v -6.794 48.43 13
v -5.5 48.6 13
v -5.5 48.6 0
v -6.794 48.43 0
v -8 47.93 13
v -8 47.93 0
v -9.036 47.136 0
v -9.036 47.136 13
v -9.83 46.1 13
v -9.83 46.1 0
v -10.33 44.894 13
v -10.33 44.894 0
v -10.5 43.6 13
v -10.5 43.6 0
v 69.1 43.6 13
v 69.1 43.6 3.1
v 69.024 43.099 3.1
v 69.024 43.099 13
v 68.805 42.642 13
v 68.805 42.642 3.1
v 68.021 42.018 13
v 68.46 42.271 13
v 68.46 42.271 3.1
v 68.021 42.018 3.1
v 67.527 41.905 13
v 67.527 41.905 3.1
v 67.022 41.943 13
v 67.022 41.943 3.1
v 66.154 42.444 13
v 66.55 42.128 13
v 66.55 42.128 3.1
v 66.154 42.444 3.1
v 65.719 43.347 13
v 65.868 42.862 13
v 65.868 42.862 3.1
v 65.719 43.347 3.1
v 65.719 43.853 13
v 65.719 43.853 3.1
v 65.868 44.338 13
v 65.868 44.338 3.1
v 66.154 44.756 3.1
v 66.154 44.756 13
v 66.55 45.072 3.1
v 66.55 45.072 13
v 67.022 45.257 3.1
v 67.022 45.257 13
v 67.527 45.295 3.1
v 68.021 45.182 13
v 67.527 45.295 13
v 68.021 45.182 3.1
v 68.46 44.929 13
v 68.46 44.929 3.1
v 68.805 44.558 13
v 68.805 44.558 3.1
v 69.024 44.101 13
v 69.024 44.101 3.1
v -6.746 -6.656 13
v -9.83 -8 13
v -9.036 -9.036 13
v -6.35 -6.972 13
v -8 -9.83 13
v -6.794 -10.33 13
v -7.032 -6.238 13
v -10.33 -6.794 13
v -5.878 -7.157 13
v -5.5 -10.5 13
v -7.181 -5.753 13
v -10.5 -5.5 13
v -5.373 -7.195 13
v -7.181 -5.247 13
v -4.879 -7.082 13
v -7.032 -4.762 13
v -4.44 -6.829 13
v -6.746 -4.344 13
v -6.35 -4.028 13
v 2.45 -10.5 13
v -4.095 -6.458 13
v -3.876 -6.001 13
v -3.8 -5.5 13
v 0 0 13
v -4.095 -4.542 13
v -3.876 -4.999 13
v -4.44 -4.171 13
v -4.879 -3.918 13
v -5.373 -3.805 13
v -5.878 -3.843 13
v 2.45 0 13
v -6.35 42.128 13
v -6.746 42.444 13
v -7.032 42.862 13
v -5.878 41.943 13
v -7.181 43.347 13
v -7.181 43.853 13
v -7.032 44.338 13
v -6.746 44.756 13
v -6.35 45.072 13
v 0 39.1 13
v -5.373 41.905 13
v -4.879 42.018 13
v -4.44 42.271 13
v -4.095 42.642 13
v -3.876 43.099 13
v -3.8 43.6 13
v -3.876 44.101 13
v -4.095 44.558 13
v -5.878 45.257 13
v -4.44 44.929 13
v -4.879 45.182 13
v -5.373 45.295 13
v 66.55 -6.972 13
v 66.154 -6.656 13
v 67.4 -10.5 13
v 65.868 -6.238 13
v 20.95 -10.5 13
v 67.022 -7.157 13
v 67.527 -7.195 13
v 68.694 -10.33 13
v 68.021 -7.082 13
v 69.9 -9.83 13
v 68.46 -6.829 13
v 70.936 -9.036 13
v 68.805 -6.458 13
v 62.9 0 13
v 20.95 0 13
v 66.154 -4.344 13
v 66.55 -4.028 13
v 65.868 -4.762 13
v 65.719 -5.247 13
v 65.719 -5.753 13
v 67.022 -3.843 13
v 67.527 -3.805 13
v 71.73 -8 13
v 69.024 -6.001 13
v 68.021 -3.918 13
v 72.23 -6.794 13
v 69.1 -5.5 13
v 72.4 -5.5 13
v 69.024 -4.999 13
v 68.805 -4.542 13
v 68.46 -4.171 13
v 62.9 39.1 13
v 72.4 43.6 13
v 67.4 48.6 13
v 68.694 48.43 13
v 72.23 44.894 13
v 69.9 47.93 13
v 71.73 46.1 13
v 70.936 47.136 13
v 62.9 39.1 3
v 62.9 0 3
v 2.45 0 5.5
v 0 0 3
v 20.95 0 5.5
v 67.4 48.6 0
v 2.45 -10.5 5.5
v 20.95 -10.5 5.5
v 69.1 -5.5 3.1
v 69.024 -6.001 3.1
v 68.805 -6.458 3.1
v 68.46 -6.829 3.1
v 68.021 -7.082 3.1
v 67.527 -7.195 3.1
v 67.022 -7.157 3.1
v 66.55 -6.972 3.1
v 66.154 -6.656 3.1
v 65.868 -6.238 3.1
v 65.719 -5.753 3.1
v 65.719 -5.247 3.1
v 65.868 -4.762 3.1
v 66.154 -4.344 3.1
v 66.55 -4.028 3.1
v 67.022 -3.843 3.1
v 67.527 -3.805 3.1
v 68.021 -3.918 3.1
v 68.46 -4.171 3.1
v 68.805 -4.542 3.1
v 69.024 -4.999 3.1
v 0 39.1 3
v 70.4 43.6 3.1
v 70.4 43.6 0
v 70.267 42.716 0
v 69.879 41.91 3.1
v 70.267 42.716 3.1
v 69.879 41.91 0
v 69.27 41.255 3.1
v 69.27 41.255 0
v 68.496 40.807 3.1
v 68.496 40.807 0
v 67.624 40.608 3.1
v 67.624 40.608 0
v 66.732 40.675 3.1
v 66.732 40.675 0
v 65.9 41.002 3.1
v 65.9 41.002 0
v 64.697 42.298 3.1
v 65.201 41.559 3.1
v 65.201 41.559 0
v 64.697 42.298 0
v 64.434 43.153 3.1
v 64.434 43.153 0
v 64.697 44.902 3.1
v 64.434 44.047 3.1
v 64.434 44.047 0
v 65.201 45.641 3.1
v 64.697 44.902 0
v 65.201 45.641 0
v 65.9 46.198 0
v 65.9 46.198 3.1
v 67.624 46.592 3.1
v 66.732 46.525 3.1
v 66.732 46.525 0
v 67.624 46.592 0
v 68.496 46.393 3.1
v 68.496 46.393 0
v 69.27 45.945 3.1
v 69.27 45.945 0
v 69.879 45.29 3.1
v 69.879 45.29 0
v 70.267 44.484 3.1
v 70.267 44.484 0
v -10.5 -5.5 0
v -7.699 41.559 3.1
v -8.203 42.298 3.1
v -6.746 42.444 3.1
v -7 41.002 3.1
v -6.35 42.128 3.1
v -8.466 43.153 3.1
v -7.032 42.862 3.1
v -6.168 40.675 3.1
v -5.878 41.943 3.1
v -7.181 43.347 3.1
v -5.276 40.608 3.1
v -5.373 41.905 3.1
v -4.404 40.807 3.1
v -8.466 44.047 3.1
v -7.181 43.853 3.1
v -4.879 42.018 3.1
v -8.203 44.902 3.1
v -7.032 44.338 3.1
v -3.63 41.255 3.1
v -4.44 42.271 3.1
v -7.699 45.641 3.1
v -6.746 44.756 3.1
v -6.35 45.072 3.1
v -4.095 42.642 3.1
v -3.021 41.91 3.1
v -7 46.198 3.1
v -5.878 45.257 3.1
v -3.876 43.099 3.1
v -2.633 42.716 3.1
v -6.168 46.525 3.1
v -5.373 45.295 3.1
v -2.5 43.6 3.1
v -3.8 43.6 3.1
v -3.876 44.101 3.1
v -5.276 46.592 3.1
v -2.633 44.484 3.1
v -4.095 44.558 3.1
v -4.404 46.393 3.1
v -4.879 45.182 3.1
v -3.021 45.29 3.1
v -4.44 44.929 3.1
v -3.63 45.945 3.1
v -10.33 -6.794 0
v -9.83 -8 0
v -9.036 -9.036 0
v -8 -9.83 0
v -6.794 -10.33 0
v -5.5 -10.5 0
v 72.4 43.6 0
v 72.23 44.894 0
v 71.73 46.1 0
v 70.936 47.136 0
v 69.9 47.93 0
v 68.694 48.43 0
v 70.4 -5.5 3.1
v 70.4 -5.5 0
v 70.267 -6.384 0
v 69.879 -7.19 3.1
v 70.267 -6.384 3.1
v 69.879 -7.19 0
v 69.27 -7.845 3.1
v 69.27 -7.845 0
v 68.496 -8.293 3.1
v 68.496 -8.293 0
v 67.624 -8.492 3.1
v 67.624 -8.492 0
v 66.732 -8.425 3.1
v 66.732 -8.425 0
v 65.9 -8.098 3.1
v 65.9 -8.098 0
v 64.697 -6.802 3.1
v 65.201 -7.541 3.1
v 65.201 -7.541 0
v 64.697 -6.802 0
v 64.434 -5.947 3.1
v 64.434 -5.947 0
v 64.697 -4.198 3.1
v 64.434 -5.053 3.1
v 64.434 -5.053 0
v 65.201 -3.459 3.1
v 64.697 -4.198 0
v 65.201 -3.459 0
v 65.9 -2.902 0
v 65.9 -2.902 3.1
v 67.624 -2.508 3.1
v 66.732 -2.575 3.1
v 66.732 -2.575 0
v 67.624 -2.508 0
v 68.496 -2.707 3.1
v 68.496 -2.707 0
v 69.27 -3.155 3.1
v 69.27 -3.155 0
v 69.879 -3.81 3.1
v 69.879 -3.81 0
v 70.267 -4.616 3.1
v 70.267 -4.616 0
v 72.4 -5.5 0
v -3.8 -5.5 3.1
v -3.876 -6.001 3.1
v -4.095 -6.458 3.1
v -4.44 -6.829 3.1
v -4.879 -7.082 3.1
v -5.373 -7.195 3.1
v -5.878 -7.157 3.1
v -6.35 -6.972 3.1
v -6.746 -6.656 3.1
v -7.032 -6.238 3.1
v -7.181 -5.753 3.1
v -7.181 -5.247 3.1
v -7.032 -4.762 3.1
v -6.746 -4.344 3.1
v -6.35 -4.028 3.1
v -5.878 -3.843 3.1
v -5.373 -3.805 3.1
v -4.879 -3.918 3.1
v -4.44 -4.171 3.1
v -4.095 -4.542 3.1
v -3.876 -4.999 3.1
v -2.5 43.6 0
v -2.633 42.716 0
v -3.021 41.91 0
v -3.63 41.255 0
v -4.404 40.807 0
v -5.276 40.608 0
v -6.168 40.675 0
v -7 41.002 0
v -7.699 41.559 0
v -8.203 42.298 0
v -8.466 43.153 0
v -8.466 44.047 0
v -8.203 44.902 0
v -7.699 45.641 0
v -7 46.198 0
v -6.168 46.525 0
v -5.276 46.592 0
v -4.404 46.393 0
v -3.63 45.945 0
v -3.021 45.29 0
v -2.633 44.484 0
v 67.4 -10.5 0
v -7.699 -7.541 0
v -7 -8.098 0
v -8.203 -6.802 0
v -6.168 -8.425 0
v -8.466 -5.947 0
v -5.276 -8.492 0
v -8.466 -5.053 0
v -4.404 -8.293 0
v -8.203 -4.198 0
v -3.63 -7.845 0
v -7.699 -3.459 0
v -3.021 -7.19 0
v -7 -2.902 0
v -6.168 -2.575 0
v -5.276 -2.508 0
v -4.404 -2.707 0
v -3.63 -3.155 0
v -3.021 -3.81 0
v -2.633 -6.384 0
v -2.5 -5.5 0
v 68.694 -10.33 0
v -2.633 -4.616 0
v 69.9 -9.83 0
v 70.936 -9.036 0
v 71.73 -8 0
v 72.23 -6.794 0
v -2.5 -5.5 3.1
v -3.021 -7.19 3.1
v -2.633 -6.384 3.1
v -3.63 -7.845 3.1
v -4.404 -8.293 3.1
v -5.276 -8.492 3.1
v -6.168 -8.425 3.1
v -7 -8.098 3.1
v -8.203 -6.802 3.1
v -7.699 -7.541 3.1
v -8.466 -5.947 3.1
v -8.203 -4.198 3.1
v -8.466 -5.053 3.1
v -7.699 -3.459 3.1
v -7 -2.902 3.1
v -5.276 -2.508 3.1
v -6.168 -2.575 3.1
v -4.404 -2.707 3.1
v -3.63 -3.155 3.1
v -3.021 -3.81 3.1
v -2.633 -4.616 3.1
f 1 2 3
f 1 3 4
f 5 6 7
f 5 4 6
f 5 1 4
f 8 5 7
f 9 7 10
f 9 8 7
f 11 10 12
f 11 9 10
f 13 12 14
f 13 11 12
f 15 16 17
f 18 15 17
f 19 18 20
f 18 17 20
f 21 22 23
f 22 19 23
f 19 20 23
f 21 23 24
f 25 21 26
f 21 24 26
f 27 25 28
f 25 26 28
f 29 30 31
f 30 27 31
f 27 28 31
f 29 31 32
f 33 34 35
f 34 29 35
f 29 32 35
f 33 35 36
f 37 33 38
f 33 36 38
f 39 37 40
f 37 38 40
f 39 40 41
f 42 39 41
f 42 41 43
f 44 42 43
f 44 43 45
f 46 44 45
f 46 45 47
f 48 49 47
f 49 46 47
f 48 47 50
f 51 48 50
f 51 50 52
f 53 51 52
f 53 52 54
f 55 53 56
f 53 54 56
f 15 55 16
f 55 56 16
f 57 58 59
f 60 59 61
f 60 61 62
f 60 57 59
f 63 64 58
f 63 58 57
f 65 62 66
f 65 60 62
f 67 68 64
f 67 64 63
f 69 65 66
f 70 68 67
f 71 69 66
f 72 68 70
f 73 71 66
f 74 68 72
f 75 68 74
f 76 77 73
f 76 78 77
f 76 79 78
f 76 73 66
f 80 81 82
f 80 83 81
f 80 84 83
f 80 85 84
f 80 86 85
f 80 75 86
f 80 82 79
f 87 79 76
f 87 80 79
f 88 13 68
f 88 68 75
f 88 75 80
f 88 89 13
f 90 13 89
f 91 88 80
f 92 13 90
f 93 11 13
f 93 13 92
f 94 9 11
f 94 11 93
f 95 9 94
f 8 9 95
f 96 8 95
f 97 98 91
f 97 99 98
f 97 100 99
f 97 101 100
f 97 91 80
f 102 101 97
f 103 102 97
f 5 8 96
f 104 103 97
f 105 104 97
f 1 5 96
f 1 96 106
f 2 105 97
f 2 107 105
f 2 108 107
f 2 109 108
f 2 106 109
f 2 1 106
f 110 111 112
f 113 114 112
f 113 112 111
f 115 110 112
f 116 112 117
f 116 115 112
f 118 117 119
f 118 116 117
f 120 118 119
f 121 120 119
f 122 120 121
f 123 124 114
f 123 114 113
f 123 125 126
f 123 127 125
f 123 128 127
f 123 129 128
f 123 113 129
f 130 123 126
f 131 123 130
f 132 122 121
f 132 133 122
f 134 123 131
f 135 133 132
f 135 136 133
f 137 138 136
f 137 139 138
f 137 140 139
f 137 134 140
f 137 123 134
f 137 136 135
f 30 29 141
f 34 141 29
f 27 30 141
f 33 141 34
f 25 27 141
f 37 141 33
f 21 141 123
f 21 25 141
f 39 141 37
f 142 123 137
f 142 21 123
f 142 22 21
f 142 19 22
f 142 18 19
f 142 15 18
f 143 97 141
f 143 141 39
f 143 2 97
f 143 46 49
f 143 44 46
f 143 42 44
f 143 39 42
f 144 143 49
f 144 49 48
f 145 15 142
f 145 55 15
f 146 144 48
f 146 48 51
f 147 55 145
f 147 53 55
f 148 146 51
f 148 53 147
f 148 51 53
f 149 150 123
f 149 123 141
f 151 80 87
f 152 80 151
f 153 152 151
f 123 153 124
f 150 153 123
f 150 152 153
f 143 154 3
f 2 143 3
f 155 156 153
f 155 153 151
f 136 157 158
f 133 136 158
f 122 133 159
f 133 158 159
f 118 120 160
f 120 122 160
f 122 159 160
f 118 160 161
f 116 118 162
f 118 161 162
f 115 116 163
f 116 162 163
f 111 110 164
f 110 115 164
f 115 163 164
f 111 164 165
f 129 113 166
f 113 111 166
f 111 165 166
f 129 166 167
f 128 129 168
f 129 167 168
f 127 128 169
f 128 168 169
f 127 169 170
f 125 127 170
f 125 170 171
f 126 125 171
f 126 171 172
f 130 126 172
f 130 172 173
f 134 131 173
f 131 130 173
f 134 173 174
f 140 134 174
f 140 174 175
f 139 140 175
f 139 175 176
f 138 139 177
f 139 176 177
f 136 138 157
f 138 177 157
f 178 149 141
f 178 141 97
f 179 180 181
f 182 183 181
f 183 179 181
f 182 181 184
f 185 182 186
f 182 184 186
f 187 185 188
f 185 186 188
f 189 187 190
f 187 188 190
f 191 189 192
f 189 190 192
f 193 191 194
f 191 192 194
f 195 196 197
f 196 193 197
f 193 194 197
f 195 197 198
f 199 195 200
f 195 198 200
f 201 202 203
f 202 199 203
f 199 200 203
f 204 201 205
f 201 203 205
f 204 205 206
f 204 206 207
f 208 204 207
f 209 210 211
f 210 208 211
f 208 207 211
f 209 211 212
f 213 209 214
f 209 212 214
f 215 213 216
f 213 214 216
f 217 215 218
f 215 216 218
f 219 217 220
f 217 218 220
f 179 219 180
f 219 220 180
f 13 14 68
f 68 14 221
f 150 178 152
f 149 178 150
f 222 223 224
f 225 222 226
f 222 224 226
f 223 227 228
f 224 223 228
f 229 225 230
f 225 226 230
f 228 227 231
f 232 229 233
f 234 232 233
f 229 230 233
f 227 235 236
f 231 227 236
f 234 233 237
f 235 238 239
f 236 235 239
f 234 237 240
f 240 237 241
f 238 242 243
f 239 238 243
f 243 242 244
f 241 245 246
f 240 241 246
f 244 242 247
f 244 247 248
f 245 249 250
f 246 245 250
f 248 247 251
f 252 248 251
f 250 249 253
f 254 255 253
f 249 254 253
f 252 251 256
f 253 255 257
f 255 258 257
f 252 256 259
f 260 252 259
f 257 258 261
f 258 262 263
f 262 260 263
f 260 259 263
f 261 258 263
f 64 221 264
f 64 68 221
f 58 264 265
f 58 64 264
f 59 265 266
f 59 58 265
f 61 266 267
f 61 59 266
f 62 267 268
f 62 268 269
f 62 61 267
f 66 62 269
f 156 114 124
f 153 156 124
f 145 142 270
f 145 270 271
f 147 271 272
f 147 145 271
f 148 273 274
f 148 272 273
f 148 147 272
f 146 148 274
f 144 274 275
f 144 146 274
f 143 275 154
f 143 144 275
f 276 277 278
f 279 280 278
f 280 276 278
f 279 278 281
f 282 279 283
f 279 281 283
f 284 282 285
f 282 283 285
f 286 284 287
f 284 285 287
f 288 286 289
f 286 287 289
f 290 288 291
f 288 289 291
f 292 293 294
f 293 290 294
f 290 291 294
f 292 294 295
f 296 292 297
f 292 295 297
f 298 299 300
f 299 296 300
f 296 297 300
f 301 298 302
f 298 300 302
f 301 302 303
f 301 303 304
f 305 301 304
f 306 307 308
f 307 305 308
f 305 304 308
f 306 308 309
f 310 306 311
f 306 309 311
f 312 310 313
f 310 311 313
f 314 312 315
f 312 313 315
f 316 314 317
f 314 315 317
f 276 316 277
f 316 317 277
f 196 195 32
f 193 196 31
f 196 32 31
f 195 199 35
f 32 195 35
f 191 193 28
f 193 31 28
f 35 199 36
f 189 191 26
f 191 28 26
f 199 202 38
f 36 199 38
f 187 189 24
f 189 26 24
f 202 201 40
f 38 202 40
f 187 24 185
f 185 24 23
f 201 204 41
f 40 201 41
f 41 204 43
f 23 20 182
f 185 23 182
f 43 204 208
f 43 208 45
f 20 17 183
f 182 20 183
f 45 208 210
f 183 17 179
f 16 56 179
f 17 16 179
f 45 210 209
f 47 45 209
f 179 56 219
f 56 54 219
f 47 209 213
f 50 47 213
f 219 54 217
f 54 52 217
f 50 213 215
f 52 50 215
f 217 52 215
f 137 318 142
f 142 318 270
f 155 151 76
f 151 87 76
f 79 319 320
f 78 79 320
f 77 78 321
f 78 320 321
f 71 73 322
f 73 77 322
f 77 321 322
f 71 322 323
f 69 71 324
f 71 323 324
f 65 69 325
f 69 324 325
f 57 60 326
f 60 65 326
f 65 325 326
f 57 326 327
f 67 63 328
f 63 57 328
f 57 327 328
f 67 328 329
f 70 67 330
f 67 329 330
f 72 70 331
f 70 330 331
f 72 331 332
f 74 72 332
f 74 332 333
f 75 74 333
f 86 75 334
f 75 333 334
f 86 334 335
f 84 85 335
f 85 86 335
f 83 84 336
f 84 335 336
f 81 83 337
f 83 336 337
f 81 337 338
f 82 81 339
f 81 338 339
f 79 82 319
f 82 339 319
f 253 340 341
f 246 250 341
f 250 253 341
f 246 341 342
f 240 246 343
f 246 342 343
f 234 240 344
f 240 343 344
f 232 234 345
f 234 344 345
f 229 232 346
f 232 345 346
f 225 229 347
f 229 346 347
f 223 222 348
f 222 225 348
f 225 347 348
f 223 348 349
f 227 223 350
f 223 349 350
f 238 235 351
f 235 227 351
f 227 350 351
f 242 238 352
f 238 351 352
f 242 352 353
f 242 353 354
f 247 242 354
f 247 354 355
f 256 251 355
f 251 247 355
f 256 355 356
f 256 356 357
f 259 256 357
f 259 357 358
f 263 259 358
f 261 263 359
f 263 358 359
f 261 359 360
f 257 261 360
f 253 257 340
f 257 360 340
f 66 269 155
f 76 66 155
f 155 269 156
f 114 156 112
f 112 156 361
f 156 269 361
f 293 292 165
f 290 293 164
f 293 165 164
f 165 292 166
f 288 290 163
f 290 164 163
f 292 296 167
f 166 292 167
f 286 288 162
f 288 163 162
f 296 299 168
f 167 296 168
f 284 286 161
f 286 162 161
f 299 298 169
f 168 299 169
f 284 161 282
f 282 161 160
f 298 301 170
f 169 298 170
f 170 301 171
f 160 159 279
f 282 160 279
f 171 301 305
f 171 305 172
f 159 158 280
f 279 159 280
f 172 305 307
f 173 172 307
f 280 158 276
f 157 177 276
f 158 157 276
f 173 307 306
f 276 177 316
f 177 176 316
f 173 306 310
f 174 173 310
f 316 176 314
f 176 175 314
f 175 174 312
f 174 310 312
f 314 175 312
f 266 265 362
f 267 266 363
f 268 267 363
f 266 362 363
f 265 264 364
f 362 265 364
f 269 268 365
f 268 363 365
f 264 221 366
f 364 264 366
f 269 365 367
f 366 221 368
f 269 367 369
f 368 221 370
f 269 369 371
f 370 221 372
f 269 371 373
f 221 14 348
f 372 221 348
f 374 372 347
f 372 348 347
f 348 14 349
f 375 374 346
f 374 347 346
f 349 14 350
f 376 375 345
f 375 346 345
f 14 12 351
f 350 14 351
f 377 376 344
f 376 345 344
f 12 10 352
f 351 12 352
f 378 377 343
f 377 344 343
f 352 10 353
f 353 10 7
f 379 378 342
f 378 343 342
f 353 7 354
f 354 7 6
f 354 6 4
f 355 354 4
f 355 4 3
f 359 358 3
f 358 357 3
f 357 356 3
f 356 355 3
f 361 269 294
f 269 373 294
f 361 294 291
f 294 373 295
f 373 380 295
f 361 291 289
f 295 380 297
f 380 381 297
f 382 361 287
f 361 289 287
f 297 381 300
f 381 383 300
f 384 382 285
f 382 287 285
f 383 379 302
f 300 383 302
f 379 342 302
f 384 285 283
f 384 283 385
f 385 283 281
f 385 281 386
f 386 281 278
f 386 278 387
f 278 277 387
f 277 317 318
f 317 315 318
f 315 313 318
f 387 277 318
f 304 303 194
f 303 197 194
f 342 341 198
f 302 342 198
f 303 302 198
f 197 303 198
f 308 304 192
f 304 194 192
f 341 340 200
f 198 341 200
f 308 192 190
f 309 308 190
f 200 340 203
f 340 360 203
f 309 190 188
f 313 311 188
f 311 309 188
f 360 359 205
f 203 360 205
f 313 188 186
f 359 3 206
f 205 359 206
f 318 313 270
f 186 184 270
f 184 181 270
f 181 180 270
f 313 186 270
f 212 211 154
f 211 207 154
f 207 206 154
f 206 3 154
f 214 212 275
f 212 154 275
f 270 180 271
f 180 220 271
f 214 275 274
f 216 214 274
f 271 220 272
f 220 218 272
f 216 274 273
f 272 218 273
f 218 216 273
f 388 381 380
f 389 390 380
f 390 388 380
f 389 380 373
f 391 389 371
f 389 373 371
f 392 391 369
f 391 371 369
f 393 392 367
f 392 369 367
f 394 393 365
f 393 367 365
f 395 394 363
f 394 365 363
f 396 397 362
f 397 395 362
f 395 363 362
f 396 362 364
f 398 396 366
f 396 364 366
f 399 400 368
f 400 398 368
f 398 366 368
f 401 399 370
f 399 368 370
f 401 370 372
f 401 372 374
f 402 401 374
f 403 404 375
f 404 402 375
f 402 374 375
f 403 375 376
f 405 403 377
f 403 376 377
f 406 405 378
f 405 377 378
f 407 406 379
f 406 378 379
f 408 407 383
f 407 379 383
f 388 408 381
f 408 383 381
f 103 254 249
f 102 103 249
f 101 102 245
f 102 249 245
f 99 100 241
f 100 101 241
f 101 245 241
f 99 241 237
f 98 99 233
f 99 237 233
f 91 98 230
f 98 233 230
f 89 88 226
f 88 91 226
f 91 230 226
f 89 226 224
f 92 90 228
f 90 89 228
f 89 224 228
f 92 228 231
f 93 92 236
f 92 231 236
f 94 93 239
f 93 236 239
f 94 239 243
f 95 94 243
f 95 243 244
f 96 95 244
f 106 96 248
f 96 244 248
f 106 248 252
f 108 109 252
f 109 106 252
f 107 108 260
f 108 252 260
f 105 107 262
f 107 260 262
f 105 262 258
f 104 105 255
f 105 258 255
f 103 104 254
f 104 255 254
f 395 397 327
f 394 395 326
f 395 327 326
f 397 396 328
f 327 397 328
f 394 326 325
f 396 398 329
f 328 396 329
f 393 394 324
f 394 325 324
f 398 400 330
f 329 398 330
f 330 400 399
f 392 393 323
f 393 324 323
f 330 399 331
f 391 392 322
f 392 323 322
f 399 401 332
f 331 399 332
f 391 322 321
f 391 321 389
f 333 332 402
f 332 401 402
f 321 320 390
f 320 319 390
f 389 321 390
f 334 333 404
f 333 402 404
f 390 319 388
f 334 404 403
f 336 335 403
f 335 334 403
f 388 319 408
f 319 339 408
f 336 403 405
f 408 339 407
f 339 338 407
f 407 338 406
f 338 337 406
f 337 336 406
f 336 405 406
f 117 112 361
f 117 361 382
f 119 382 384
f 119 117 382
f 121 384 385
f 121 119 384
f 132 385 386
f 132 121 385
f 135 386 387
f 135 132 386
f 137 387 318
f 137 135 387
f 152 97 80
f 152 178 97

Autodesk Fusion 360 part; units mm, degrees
sketch "Esboço1" plane through (0, 0, 0) normal (0, 0, 1) x (1, 0, 0) in component "VibePad Gaming"
  line L0 (0, 0) -> (62.9, 0)
  line L1 (62.9, 0) -> (62.9, 39.1)
  line L2 (62.9, 39.1) -> (0, 39.1)
  line L3 (0, 39.1) -> (0, 0)
  line L4 (-10.5, -10.5) -> (72.4, -10.5)
  line L5 (72.4, -10.5) -> (72.4, 48.6)
  line L6 (72.4, 48.6) -> (-10.5, 48.6)
  line L7 (-10.5, 48.6) -> (-10.5, -10.5)
  circle A0 centre (-5.5, 43.6) radius 1.7
  circle A1 centre (67.4, 43.6) radius 1.7
  circle A2 centre (67.4, -5.5) radius 1.7
  circle A3 centre (-5.5, -5.5) radius 1.7
  circle A4 centre (67.4, -5.5) radius 3
  circle A5 centre (67.4, 43.6) radius 3
  circle A6 centre (-5.5, 43.6) radius 3
  circle A7 centre (-5.5, -5.5) radius 3
  dimension "d1" = 62.9
  dimension "d2" = 39.1
  dimension "d3" = 82.9
  dimension "d4" = 59.1
  dimension "d5" = 9.5
  dimension "d6" = 9.5
  dimension "d7" = 3.4
  dimension "d8" = 3.4
  dimension "d9" = 3.4
  dimension "d10" = 3.4
  dimension "d11" = 5
  dimension "d12" = 5
  dimension "d13" = 5
  dimension "d14" = 5
  dimension "d15" = 5
  dimension "d16" = 5
  dimension "d17" = 5
  dimension "d18" = 5
  dimension "d19" = 6
  dimension "d20" = 6
  dimension "d21" = 6
  dimension "d22" = 6
extrude "Extrusão1" add sketch "Esboço1" along normal blind 9.9 from surface at 3.1 contours A4 | A5 | A6 | A7 makes body 1 at (66.0314, 40.9304, 6.4) makes body 2 at (-2.5037, 43.4505, 9.7) makes body 3 at (66.0314, -8.1696, 6.4) makes body 4 at (-2.5037, -5.6495, 9.7) in component "VibePad Gaming"
extrude "Extrusão2" add sketch "Esboço1" along normal blind 13 contours L4 L5 L6 L7 bodies 1 2 3 4 in component "VibePad Gaming"
extrude "Extrusão3" add sketch "Esboço1" along normal blind 3 contours L0 L1 L2 L3 bodies 1 in component "VibePad Gaming"
sketch "Esboço2" plane through (0, 0, 13) normal (0, 0, 1) x (-1, 0, 0) in component "VibePad Gaming"
  circle A0 centre (-67.4, -43.6) radius 1.7
  circle A1 centre (5.5, 5.5) radius 1.7
  line L0 (0, 0) -> (0, -39.1)
  line L1 (0, -39.1) -> (-62.9, -39.1)
  line L2 (-62.9, -39.1) -> (-62.9, 0)
  line L3 (-62.9, 0) -> (0, 0)
  line L4 (10.5, -48.6) -> (10.5, 10.5)
  line L5 (10.5, 10.5) -> (-72.4, 10.5)
  line L6 (-72.4, 10.5) -> (-72.4, -48.6)
  line L7 (-72.4, -48.6) -> (10.5, -48.6)
  circle A2 centre (5.5, -43.6) radius 1.7
  circle A3 centre (-67.4, 5.5) radius 1.7
  line L8 (-20.95, 0) -> (-2.45, 0)
  line L9 (-2.45, 0) -> (-2.45, 10.5)
  line L10 (-2.45, 10.5) -> (-20.95, 10.5)
  line L11 (-20.95, 10.5) -> (-20.95, 0)
  line L12 (10.5, -48.6) -> (10.5, 10.5)
  dimension "d30" = 18.5
  dimension "d31" = 12.95
extrude "Extrusão4" cut sketch "Esboço2" against normal blind 7.5 contours L3 L5 L8 L9 L10 L11 bodies 1 in component "VibePad Gaming"
fillet "Arredondamento1" radius 5 1 edges at (-10.5, 48.6, 6.5) on bodies 1 in component "VibePad Gaming"
fillet "Arredondamento2" radius 5 1 edges at (-10.5, -10.5, 6.5) on bodies 1 in component "VibePad Gaming"
fillet "Arredondamento3" radius 5 2 edges at (72.4, 48.6, 6.5) (72.4, -10.5, 6.5) on bodies 1 in component "VibePad Gaming"
component "VibePad Gaming" placed x (1, 0, 0) y (0, 1, 0) z (0, 0, 1) at (0, 0, 0)
